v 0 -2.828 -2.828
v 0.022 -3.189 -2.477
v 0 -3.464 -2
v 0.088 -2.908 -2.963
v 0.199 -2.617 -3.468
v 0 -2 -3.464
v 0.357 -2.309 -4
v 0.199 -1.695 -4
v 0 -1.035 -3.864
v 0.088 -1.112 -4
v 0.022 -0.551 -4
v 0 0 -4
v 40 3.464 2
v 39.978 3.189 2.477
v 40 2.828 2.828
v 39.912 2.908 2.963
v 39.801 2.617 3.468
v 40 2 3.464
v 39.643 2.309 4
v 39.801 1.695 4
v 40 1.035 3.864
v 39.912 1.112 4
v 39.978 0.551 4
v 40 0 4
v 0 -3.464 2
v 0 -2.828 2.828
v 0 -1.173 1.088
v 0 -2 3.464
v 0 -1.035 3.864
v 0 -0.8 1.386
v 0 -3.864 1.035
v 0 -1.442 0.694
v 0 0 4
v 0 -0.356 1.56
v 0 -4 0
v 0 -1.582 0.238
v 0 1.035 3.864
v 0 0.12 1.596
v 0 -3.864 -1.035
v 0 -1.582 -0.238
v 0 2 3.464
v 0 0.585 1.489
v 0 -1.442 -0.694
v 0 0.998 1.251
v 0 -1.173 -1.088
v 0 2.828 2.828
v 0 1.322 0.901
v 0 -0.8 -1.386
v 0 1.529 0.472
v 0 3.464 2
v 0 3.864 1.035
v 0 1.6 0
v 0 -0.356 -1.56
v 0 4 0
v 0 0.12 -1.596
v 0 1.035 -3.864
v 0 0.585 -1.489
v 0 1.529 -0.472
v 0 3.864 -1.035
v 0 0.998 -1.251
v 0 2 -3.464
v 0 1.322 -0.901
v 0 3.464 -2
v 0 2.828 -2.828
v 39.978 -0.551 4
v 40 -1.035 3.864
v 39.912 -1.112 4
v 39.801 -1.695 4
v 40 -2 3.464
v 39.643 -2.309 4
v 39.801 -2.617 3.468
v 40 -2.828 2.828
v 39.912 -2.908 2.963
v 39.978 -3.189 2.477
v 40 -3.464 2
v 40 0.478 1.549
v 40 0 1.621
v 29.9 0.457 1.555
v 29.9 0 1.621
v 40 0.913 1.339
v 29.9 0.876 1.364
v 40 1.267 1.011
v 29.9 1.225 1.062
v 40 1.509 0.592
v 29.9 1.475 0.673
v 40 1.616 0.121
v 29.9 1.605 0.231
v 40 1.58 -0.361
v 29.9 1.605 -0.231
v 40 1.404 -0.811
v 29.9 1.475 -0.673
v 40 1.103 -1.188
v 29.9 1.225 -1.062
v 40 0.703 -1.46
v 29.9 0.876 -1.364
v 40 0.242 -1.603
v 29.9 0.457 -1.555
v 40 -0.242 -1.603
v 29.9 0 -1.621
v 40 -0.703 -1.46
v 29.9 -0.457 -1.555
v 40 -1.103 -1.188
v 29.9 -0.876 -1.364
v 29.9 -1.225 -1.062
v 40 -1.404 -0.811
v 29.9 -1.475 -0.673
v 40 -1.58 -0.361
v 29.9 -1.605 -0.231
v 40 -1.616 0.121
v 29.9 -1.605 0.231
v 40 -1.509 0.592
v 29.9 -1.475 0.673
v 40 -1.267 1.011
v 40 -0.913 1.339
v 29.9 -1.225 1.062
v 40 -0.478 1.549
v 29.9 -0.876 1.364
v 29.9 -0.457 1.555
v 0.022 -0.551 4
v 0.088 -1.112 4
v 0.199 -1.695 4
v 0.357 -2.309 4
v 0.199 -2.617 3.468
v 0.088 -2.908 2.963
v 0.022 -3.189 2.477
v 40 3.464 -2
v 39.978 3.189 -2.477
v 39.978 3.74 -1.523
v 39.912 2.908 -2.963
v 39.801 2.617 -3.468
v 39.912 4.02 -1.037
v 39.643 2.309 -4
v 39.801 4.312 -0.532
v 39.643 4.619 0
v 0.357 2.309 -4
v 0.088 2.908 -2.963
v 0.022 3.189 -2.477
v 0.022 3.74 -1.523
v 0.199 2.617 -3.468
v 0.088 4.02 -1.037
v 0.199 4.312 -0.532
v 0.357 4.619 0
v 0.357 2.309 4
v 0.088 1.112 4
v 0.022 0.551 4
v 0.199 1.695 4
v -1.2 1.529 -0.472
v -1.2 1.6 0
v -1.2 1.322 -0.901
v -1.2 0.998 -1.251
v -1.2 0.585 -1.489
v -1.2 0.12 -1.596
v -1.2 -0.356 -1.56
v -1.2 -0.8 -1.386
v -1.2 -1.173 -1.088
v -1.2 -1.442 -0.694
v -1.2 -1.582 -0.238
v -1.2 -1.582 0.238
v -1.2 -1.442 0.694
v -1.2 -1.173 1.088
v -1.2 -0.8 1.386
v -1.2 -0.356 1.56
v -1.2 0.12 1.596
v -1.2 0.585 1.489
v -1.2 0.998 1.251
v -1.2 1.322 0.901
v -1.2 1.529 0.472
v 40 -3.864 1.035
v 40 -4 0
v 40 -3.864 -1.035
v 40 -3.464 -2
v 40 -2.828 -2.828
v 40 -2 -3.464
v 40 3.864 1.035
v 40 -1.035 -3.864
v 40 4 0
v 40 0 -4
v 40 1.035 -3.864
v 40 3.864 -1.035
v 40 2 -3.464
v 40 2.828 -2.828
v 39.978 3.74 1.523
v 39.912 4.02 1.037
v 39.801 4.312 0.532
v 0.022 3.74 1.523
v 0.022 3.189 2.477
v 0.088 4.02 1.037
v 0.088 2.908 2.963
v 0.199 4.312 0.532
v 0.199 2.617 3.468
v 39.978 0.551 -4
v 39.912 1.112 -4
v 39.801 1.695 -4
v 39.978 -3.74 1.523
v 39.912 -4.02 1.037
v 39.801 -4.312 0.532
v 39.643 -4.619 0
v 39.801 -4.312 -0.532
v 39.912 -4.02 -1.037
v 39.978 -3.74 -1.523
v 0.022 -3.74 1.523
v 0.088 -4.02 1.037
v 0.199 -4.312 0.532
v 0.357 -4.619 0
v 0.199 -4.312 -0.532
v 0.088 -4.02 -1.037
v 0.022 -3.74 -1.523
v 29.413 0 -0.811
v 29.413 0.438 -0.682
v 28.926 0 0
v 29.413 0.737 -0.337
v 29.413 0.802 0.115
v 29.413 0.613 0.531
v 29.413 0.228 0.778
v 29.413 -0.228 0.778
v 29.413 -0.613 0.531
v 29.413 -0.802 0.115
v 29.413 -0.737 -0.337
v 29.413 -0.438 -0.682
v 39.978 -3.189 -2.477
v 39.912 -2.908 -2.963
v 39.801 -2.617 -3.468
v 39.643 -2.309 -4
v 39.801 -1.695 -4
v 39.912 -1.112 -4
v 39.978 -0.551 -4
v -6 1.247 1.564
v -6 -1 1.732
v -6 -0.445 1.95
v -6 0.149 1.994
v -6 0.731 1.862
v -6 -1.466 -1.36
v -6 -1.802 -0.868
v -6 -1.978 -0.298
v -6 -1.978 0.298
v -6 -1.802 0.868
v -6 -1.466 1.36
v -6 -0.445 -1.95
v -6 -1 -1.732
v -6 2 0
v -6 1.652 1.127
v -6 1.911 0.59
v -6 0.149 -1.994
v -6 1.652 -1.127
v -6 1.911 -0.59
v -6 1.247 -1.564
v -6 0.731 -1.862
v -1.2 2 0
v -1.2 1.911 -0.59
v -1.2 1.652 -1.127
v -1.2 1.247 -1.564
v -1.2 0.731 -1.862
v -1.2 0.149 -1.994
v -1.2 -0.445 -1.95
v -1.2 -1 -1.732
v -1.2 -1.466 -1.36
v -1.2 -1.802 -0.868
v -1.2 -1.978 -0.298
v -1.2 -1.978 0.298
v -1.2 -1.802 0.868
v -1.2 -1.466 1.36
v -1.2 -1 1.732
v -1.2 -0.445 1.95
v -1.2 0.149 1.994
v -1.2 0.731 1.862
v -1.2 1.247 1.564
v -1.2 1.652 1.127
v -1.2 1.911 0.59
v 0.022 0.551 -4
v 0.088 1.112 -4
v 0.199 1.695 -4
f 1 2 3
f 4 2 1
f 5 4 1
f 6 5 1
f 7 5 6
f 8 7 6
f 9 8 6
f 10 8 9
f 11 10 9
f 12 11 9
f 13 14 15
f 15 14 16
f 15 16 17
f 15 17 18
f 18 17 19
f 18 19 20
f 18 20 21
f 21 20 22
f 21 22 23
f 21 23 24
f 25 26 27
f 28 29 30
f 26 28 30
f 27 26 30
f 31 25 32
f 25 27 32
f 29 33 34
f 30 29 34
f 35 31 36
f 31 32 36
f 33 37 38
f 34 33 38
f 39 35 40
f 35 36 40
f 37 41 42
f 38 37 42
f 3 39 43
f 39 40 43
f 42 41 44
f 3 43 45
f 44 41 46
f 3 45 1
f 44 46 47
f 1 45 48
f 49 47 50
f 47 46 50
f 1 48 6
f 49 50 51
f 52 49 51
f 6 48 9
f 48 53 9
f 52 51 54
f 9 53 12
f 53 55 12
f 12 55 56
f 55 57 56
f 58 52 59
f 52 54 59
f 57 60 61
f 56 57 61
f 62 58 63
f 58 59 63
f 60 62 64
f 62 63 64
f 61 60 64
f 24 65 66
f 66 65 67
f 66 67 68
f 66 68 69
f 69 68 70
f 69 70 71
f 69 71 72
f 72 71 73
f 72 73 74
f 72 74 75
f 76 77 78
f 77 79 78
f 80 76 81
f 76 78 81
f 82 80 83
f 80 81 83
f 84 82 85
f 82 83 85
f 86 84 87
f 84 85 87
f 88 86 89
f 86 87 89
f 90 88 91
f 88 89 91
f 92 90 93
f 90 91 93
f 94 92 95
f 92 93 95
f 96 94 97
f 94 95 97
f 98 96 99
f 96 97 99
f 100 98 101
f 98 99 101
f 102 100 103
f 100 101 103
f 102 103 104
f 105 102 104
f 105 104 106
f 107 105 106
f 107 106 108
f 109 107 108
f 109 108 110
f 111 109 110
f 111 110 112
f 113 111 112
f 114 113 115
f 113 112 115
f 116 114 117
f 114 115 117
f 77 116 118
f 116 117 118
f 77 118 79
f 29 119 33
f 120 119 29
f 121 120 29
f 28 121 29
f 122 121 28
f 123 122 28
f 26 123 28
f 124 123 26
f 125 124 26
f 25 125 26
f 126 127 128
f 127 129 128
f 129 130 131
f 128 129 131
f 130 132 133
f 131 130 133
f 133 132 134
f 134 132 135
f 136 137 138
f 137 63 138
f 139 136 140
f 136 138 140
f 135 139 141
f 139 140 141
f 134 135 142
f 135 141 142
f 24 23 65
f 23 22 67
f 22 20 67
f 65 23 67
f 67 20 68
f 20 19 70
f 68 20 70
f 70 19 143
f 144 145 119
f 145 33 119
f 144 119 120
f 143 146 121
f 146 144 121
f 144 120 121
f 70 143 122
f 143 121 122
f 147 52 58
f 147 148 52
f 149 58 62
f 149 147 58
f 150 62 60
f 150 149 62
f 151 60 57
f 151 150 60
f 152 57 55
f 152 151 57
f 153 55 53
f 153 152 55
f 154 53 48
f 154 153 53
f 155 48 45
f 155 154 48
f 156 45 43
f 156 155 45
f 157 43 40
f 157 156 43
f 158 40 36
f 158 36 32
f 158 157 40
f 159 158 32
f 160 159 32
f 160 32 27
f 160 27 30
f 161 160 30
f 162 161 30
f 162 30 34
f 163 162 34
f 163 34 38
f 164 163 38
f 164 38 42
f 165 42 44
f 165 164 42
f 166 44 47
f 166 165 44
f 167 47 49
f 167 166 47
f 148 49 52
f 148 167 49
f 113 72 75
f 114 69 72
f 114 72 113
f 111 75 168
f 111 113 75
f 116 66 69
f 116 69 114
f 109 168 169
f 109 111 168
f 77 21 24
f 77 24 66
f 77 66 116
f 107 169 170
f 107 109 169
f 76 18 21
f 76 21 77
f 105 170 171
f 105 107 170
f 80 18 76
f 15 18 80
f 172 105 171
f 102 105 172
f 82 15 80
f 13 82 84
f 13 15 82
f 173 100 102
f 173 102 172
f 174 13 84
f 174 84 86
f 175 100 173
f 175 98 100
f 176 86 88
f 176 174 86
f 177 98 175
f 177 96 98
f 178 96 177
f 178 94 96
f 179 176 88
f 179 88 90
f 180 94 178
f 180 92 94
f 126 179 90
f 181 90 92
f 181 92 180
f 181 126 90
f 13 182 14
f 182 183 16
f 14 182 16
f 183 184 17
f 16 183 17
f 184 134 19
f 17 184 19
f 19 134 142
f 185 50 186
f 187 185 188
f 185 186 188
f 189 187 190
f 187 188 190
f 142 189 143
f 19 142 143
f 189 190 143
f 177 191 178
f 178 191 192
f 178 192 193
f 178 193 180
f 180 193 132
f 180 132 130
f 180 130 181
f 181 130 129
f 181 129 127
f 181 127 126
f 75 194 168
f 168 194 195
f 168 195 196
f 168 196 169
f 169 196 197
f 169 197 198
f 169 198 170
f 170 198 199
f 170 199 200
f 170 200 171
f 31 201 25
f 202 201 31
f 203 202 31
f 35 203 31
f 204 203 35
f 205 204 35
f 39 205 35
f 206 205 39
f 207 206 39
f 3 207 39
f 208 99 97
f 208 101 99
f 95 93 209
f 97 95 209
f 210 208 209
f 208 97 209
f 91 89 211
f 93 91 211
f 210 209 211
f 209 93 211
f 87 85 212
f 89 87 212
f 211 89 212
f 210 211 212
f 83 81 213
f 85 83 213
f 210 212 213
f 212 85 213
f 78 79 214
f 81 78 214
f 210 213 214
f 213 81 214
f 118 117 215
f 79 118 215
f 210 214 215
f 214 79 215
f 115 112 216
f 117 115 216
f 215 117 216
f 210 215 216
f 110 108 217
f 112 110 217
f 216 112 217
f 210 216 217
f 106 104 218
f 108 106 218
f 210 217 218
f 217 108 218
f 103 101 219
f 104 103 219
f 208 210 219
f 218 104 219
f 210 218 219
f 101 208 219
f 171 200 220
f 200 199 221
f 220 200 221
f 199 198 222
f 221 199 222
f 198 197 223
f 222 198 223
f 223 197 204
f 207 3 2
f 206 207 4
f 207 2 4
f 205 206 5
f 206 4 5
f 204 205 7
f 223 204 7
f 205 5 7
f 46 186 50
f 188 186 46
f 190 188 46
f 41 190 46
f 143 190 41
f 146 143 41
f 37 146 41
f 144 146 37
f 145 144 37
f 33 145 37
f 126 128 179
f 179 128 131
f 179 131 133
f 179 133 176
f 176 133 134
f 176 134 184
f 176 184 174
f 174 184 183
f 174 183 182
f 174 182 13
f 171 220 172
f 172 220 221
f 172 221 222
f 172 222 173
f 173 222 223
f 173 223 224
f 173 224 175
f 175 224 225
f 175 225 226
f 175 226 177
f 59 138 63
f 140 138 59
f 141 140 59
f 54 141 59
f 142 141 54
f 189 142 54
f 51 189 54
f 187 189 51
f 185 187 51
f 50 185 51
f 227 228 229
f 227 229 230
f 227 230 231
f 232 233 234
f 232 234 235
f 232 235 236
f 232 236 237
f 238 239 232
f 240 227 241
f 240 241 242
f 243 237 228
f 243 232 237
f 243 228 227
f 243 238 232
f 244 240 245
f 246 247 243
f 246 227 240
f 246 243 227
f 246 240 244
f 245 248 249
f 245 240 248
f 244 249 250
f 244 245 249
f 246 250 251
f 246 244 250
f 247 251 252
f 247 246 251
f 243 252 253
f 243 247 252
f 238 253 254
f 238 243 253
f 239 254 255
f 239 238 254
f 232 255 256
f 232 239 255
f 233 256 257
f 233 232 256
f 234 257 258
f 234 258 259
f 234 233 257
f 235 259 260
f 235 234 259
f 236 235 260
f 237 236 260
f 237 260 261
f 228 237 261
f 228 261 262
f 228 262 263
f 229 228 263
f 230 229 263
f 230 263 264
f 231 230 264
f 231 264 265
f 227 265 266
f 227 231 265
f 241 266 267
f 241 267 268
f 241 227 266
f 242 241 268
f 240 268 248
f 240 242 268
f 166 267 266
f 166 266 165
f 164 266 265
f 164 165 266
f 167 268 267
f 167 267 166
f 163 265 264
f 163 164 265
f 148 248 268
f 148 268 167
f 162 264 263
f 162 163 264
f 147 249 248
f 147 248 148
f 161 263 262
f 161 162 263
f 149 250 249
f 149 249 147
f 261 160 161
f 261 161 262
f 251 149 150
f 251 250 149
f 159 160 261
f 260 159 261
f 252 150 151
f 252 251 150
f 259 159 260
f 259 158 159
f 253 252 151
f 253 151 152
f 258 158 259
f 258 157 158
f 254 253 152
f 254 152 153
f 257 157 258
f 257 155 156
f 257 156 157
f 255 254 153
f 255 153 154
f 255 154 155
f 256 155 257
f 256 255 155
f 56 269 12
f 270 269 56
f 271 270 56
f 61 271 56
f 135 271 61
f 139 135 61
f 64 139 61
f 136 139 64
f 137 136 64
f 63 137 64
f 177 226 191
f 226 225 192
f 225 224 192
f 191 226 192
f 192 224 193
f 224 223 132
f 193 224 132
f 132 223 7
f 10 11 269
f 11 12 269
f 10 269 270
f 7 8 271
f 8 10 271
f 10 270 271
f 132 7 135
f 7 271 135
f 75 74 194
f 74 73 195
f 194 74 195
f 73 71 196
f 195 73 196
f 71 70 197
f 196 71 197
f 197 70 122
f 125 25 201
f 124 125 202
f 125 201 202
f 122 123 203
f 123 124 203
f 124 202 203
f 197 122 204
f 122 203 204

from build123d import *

# Parameters (mm, degrees)
BOSS_EXTRUDE1_DEPTH = 40
TAP4_D              = 3.242
TAP4_DEPTH          = 10.1
TAP4_TIP            = 0.973995063


with BuildPart() as part:
    # Sketch1 → Boss-Extrude1 (new body)
    with BuildSketch(Plane(origin=(0, 0, 0), x_dir=(0, 0, -1), z_dir=(1, 0, 0))):
        Polygon((0, 4.618802154), (-4, 2.309401077), (-4, -2.309401077), (0, -4.618802154), (4, -2.309401077), (4, 2.309401077), align=None)
    extrude(amount=BOSS_EXTRUDE1_DEPTH)

    # Sketch2 → Cut-Revolve1 (revolve, cut)
    with BuildSketch(Plane.XY):
        Polygon((0, 4.618802154), (0, 4), (0.35726559, 4.618802154), align=None)
        Polygon((39.64273441, 4.618802154), (40, 4.618802154), (40, 4), align=None)
    revolve(axis=Axis((0, 0, 0), (1, 0, 0)), mode=Mode.SUBTRACT)

    # Sketch11 → Revolve3 (revolve)
    with BuildSketch(Plane.XY):
        Polygon((0, 0), (0, 1.6), (-1.2, 1.6), (-1.2, 2), (-6, 2), (-6, 0), align=None)
    revolve(axis=Axis((0, 0, 0), (-1, 0, 0)))

    # Tap4
    with Locations(Plane(origin=(40, 0, 0), x_dir=(0, 0, -1), z_dir=(1, 0, 0))):
        with Locations((0, 0)):
            Hole(TAP4_D / 2, depth=TAP4_DEPTH)
            with Locations((0, 0, -(TAP4_DEPTH + TAP4_TIP / 2))):  # 118° drill point
                Cone(0, TAP4_D / 2, TAP4_TIP, mode=Mode.SUBTRACT)


solid = part.part
